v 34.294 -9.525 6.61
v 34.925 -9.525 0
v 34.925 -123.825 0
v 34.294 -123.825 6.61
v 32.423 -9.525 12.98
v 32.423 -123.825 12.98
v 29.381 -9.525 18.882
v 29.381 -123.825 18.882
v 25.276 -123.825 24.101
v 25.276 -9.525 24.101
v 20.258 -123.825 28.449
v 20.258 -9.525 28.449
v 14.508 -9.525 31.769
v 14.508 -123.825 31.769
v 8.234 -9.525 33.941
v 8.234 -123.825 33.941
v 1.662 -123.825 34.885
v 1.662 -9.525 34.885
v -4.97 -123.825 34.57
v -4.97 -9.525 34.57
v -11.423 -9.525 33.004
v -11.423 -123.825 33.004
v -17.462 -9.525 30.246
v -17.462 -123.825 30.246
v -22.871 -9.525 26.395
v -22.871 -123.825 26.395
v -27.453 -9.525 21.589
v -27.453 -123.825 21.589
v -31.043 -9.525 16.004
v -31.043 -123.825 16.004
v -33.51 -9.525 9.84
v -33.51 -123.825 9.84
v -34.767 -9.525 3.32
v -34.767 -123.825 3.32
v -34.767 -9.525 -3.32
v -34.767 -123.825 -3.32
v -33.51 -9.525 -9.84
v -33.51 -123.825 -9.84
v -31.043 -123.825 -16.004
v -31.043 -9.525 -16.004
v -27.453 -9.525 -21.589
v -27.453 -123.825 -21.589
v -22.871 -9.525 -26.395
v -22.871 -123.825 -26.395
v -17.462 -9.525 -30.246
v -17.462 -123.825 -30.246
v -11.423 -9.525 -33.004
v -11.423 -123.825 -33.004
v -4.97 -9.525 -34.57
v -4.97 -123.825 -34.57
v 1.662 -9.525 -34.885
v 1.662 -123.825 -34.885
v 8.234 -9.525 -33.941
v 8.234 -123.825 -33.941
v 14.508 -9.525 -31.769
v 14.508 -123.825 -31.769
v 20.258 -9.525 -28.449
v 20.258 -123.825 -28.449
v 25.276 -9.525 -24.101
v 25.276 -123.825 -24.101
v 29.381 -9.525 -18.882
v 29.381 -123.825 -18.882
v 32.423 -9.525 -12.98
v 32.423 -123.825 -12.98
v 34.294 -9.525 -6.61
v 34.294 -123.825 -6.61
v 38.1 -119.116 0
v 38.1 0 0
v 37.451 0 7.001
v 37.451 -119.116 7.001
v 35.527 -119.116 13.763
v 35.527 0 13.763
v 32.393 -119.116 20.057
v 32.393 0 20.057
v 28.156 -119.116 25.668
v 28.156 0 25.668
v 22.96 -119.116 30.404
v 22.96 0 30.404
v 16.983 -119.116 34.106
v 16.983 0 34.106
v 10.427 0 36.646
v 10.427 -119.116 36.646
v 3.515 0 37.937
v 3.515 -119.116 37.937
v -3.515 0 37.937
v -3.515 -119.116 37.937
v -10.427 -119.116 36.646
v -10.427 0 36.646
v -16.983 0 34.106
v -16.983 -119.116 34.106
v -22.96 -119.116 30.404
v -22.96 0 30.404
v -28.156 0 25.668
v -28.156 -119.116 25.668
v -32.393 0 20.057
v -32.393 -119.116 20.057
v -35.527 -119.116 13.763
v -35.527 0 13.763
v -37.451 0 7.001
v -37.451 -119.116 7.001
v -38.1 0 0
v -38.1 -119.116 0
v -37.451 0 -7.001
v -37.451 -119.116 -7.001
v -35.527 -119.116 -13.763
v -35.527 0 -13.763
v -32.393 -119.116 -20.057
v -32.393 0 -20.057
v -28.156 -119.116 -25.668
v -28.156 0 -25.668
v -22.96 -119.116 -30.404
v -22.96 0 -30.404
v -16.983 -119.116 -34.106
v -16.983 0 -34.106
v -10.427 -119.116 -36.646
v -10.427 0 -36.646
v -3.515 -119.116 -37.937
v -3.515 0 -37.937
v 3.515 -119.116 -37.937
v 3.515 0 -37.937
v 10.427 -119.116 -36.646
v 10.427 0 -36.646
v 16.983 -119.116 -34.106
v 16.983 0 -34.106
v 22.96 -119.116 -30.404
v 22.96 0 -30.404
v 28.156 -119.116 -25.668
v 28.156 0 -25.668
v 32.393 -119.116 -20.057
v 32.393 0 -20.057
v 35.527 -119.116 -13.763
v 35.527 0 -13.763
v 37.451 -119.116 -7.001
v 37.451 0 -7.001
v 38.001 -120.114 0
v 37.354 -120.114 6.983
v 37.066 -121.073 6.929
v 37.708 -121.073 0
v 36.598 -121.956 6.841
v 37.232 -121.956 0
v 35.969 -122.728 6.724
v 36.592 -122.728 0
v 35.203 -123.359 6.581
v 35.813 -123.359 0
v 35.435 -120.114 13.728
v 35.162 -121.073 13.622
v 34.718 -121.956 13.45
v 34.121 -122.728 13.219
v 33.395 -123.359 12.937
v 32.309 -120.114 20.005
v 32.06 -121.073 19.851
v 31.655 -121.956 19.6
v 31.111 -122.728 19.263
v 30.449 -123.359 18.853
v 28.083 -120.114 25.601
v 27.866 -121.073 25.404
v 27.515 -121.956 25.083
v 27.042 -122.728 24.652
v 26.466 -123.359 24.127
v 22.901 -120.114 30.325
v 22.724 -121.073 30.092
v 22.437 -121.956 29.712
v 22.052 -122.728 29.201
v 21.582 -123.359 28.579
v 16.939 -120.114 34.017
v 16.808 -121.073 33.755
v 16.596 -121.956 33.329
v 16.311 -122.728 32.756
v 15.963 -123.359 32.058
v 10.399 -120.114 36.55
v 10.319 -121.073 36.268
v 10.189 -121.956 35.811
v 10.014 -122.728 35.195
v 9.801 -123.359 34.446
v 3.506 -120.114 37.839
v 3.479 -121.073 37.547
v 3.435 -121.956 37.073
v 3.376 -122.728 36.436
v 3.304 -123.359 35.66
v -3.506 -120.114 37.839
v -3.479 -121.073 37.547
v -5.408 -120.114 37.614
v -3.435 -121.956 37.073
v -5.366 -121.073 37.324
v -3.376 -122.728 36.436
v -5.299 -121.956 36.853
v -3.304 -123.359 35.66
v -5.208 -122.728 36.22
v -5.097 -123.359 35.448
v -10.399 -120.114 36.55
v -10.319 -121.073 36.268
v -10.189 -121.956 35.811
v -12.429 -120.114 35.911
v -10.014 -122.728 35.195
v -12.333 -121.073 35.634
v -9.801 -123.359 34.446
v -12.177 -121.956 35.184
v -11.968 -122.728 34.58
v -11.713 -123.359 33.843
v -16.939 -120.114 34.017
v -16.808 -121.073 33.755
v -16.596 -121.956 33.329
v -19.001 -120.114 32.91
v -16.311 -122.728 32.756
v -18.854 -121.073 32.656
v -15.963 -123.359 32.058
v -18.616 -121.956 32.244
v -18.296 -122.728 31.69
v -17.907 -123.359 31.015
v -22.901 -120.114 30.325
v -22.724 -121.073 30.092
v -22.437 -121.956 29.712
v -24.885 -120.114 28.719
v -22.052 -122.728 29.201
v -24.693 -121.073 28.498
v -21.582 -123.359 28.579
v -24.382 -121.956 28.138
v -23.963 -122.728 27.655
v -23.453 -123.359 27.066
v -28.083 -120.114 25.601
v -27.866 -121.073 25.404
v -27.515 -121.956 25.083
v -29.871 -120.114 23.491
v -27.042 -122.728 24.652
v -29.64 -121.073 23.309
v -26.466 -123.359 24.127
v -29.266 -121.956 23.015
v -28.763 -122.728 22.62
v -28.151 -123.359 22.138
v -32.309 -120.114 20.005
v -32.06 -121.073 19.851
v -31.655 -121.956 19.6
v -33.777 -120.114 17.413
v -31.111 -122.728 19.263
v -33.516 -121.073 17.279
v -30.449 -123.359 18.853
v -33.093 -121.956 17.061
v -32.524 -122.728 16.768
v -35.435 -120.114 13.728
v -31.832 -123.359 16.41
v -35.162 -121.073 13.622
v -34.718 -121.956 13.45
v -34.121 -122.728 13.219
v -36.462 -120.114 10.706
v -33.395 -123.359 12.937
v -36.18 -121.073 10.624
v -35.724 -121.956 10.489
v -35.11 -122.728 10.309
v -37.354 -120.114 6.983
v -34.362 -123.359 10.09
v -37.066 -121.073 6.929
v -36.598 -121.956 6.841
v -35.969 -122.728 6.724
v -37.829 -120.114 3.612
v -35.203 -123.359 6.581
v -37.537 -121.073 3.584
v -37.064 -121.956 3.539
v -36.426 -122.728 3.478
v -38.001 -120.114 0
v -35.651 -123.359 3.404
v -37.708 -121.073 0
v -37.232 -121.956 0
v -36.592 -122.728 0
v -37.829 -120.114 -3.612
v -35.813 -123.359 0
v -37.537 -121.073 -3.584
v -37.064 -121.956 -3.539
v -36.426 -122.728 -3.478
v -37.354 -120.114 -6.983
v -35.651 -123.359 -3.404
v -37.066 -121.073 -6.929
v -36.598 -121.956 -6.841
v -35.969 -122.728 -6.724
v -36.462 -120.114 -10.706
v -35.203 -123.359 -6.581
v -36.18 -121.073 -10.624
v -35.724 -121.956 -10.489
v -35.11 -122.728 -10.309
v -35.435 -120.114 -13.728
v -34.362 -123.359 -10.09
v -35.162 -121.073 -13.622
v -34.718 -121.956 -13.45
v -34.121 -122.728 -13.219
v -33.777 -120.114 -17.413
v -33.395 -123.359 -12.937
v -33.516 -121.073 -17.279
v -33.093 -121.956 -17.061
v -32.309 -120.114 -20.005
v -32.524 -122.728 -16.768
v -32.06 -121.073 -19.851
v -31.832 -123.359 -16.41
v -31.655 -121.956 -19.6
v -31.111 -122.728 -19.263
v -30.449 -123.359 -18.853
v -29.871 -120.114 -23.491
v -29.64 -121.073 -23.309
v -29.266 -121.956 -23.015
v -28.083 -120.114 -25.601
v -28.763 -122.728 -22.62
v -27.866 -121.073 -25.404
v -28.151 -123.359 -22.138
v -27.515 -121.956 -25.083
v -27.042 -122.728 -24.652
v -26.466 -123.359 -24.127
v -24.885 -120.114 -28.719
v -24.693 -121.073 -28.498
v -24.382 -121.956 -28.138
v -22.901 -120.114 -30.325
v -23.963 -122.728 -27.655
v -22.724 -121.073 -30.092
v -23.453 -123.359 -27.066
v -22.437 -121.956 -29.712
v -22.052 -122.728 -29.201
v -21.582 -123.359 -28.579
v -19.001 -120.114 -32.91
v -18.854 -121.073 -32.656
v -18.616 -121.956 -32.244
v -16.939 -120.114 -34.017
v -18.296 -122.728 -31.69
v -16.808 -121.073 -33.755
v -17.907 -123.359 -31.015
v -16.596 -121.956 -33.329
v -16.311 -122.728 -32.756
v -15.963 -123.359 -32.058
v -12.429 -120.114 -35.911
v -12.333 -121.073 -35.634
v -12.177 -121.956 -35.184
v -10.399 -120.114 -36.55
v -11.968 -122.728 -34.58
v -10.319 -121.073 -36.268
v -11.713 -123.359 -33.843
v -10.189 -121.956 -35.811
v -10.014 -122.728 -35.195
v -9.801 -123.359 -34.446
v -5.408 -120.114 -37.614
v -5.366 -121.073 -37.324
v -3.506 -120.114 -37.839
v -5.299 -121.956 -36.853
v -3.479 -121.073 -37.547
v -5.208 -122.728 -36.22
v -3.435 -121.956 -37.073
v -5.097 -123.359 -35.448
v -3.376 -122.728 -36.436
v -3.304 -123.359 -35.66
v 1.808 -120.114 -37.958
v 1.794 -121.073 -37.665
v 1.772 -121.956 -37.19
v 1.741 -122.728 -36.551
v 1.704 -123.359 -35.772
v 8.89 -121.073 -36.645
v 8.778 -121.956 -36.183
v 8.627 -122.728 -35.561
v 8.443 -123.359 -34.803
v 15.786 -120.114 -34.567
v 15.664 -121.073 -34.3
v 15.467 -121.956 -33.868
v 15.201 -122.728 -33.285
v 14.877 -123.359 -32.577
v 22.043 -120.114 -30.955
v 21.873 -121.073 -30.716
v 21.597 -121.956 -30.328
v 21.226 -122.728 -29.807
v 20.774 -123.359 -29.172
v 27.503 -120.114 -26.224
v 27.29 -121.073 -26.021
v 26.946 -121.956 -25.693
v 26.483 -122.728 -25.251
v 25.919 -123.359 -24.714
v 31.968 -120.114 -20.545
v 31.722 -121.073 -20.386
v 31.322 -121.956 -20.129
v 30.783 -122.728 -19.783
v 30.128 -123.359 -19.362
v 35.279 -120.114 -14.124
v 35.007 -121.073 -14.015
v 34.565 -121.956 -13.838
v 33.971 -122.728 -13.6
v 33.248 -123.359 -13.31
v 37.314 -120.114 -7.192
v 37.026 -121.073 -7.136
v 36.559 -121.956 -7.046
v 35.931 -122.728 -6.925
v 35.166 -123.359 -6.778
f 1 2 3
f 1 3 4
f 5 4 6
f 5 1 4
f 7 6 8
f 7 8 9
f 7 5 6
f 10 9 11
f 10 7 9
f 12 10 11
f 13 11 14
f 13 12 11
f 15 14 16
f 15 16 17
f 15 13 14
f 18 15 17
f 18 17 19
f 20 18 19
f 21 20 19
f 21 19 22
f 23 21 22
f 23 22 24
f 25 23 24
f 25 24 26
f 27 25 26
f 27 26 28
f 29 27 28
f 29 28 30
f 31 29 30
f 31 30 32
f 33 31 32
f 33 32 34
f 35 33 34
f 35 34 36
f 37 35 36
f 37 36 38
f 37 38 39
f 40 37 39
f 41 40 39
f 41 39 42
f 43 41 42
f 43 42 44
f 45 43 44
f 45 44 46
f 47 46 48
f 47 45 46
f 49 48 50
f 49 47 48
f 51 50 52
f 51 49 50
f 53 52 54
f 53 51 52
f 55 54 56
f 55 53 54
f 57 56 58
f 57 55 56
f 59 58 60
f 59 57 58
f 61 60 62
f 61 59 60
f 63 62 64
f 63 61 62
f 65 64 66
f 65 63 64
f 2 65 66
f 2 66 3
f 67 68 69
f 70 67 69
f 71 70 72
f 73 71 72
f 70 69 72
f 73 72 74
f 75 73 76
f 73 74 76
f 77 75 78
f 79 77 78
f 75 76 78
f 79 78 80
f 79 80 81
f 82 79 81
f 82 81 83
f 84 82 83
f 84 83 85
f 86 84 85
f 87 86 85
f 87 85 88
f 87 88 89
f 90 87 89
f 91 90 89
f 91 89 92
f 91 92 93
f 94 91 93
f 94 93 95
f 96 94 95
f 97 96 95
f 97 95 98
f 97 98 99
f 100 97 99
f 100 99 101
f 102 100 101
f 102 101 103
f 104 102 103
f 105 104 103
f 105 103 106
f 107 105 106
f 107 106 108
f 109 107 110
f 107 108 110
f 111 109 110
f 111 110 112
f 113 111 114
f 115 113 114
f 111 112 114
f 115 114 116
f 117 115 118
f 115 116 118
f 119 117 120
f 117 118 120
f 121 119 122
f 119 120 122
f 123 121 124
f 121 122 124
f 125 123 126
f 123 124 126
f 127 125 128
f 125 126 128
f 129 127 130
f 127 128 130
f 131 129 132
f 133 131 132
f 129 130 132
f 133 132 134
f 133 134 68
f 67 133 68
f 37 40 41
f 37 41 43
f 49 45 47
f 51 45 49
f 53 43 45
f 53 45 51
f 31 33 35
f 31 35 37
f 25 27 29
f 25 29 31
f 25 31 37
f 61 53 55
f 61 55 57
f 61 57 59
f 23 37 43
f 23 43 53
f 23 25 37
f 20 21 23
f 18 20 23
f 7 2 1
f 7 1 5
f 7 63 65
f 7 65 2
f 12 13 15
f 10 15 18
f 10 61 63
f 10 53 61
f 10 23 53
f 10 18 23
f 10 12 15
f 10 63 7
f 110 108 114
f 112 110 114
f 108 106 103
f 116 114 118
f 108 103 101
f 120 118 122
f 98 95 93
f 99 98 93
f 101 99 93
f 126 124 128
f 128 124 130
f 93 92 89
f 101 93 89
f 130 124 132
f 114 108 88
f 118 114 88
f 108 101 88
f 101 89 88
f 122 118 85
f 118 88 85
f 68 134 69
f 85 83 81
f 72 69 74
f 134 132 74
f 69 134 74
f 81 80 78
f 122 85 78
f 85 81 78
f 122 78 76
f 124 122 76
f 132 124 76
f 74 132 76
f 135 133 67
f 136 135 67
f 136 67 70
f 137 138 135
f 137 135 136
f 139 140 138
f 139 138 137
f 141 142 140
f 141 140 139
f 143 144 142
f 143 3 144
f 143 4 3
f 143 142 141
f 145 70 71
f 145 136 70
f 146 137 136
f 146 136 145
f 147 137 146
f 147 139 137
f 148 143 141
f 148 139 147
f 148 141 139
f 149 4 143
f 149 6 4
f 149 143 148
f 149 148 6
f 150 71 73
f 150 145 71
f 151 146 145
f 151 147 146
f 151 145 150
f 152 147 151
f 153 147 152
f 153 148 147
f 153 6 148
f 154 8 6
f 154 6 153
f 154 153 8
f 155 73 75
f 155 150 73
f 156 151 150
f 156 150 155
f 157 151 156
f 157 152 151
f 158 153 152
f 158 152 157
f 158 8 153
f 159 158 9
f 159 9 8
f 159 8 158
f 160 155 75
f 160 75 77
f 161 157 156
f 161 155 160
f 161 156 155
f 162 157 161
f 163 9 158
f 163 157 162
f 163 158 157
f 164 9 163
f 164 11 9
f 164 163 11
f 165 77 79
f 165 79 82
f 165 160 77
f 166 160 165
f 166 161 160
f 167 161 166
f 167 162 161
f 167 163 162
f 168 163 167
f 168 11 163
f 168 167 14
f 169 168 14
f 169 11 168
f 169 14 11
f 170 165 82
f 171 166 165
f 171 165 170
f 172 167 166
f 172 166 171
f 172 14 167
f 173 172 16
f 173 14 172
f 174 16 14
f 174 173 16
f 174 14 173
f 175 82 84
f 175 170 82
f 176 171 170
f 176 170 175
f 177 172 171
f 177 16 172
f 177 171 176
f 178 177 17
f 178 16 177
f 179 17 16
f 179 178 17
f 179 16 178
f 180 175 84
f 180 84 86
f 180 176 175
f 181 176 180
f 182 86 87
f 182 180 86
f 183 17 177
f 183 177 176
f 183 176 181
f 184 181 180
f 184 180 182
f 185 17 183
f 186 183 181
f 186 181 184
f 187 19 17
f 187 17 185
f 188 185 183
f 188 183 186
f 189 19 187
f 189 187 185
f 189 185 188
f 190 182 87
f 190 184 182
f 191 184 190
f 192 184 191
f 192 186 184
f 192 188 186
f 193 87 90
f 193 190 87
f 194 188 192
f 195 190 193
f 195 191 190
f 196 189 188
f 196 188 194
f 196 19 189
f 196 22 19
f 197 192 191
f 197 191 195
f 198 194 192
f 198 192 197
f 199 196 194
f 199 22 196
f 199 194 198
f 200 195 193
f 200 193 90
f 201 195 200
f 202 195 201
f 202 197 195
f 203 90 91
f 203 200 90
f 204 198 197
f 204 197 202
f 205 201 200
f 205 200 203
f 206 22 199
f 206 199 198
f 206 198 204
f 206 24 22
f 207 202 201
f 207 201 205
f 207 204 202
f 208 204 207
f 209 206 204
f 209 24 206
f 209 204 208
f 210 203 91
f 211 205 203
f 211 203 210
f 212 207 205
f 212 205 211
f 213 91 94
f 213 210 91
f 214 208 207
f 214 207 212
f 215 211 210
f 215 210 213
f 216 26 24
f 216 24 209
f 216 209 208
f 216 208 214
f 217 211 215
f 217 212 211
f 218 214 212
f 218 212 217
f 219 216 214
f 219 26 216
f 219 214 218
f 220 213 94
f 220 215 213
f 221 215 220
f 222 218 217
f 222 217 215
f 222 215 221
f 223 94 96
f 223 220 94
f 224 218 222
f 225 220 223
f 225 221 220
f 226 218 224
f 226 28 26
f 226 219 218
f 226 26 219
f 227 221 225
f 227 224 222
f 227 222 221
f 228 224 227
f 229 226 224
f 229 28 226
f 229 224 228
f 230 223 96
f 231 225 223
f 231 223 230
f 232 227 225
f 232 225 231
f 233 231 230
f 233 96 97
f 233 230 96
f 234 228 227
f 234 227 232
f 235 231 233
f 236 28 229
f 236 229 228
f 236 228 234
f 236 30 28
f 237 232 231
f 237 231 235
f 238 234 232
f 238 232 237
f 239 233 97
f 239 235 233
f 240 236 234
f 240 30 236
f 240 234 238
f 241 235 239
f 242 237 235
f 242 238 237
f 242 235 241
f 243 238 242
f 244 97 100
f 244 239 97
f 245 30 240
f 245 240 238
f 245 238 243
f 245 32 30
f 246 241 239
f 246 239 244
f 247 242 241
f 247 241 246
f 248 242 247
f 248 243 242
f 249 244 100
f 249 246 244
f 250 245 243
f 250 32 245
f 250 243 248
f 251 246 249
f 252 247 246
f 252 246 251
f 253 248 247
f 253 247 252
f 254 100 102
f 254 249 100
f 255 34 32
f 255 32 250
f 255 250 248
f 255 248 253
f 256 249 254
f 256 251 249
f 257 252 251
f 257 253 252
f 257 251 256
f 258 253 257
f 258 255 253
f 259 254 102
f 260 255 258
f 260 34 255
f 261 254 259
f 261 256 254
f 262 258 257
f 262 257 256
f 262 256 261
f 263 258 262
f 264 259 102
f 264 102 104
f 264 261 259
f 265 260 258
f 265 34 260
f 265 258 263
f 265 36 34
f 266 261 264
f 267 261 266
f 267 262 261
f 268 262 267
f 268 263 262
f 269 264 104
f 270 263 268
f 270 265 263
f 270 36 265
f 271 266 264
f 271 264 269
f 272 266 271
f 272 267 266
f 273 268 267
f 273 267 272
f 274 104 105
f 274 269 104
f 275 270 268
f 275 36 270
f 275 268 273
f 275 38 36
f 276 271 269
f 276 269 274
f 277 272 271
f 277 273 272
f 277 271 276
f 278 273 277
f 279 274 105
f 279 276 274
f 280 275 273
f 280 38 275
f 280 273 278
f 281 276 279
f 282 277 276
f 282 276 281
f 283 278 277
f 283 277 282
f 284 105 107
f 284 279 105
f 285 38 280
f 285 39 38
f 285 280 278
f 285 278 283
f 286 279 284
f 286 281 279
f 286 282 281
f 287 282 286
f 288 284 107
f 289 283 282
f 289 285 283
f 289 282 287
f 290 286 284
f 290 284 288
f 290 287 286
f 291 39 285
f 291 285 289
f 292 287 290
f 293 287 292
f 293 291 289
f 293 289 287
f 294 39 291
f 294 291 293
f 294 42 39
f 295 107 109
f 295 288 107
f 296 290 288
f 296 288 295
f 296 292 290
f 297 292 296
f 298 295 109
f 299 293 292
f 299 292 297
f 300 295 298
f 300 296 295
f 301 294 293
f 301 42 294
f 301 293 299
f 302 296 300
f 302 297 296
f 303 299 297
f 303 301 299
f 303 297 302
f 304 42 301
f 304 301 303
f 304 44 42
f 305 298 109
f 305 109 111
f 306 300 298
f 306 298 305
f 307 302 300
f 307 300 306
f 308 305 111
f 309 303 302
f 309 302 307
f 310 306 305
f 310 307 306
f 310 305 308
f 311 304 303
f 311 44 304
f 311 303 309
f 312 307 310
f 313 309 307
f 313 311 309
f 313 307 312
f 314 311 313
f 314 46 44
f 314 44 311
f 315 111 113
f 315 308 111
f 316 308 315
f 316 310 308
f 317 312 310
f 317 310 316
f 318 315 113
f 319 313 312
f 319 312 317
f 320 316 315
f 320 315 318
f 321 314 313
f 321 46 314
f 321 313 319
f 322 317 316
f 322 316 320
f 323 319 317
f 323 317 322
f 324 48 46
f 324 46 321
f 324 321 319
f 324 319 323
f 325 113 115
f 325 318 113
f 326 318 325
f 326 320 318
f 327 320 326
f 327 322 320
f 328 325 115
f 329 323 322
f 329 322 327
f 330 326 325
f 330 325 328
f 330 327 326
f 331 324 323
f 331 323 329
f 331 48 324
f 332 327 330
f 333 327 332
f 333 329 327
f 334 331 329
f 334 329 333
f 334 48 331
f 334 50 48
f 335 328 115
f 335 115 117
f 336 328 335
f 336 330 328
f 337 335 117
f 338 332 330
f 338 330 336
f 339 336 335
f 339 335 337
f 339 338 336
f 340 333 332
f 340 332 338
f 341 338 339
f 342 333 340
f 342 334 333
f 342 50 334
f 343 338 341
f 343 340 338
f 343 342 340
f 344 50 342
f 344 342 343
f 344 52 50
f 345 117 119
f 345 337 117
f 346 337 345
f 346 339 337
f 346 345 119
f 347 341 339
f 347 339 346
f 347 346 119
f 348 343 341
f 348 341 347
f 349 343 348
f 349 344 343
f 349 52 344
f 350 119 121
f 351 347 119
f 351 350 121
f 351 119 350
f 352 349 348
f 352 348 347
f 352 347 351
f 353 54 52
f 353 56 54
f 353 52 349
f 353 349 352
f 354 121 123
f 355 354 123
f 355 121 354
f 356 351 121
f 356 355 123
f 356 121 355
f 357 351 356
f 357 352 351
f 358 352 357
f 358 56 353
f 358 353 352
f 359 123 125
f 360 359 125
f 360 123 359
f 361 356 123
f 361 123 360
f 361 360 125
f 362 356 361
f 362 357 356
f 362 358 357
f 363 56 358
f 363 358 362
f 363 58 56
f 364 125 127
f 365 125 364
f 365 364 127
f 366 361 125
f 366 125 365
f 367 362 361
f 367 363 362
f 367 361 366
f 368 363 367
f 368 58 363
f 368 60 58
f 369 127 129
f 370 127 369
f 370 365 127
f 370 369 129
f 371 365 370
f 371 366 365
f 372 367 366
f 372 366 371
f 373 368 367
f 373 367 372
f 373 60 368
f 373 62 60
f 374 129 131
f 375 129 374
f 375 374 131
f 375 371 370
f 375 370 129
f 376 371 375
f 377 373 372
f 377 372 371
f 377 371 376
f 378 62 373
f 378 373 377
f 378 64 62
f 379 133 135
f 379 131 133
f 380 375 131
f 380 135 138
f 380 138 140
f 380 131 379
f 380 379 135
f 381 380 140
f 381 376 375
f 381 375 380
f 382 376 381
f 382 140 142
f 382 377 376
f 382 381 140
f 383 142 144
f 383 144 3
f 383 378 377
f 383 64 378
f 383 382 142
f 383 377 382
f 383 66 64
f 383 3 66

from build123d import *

# Parameters (mm, degrees)
F0_R     = 38.1
F0_R_2   = 34.925
F1_DEPTH = 123.825
F2_R     = 34.925
F3_DEPTH = 9.525


# Not quite as in the source:
# - a fillet or chamfer that OpenCascade refuses, or shapes differently, is made with other operations: its cross-section is extruded or revolved along the edge and cut away or added


with BuildPart() as f1:
    # F0 (on Front) → F1 (new body)
    with BuildSketch(Plane.XZ):
        Circle(F0_R)
        Circle(F0_R_2, mode=Mode.SUBTRACT)
    extrude(amount=F1_DEPTH)

    # F2 (on Front) → F3 (join)
    with BuildSketch(Plane.XZ):
        Circle(F2_R)
    extrude(amount=F3_DEPTH)

    # F4: fillet of radius 5.08 on 1 edges, made by hand

    # F4_s1 → F4_t2 (revolve, cut)
    with BuildSketch(Plane.XY):
        with BuildLine():
            ThreePointArc((38.1, -119.1157139607), (37.2321134838, -121.9555202921), (34.925, -123.825))
            Line((34.925, -123.825), (38.1, -123.825))
            Line((38.1, -123.825), (38.1, -119.1157139607))
        make_face()
    revolve(axis=Axis((0, -123.825, 0), (0, -1, 0)), mode=Mode.SUBTRACT)


solid = f1.part
